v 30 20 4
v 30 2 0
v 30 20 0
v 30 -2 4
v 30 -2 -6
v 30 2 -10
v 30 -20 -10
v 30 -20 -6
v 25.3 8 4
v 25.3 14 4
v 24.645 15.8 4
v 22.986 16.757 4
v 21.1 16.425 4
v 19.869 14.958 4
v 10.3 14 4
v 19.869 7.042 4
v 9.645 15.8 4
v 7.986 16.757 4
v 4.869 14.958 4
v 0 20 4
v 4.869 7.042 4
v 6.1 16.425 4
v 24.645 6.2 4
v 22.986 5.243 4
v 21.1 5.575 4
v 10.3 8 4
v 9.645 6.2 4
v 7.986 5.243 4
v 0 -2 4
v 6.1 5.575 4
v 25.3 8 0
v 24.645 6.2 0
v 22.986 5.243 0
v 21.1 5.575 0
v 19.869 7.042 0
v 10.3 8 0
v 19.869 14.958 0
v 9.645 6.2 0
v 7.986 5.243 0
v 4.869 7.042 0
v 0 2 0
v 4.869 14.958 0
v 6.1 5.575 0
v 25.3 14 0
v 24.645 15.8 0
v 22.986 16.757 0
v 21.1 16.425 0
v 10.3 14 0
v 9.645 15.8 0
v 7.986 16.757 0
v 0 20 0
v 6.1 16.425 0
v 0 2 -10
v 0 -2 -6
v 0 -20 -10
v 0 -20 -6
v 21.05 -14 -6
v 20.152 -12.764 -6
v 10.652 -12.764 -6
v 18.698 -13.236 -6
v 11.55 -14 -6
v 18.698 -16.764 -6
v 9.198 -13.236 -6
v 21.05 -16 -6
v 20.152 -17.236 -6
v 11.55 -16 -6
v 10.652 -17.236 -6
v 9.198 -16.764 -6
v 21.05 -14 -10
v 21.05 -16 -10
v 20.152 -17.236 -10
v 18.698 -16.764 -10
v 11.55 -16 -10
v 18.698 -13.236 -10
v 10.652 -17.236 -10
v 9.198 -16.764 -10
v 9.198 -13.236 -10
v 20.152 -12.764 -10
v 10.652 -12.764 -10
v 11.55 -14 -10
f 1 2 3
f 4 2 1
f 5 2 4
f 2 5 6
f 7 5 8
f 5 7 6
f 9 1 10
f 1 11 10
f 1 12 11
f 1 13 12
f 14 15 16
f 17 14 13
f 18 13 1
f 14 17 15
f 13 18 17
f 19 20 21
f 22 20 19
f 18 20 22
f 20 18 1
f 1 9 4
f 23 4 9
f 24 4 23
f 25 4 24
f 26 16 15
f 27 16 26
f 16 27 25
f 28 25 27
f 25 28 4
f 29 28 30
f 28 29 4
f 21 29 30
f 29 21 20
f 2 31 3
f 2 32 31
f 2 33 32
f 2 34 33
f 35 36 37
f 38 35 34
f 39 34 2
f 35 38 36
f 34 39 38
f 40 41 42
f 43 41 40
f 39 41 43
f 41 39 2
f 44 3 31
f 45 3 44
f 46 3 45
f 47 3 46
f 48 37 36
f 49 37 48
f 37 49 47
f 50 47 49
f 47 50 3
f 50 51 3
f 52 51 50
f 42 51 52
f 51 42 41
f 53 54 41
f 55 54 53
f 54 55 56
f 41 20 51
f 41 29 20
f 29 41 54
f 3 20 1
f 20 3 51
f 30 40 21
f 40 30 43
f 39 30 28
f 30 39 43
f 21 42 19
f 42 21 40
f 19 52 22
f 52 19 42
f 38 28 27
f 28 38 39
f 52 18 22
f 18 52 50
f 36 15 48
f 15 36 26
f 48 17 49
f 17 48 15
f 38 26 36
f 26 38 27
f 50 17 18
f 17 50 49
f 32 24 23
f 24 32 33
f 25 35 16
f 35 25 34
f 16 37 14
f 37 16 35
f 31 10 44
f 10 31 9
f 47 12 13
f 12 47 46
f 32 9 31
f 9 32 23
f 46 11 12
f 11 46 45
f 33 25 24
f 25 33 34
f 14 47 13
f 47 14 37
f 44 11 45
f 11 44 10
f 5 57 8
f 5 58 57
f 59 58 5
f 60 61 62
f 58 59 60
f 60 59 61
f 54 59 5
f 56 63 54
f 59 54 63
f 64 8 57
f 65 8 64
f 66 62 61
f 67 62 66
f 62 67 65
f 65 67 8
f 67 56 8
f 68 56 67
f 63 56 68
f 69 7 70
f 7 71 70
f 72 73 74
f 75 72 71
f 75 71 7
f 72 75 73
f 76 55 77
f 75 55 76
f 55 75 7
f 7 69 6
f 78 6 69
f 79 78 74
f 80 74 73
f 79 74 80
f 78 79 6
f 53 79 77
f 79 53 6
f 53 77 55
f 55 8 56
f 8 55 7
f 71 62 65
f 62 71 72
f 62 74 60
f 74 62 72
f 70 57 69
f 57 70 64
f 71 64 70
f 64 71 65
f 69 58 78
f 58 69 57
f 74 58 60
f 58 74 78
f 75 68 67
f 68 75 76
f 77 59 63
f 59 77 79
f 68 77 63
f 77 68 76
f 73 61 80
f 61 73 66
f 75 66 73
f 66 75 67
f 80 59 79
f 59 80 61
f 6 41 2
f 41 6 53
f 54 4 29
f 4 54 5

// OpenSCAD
// switch hole distance
s_h_dist = 9.5;

// switch hole diameter
s_h_dia = 2+0.6;

// switch length
s_l = 20;

// switch height ( from extrusion)
s_h = 10;

width = 30;
length = 20;
height = 20;

thickness = 4;

switch_dist = 20;

// 2020 attach

difference(){
    
    cube([width,length,thickness]);
    hull(){
    translate([1/4*width,length*0.4,-0.5*thickness]) cylinder(2*thickness,d=5+0.6);
    translate([1/4*width,length*0.7,-0.5*thickness]) cylinder(2*thickness,d=5+0.6);
    }
    hull(){
    translate([3/4*width,length*0.4,-0.5*thickness]) cylinder(2*thickness,d=5+0.6);
    translate([3/4*width,length*0.7,-0.5*thickness]) cylinder(2*thickness,d=5+0.6);
    }
}

// Limit switch attach
translate([0,-switch_dist,-10 ])
difference(){
    translate([0,0,0]) cube([width,s_l,thickness]);
    hull(){
        translate([(s_h_dist+width)/2,thickness,-1]) 
        cylinder(thickness*1.5,d=s_h_dia);
        translate([(s_h_dist+width)/2,thickness+2,-1]) 
        cylinder(thickness*1.5,d=s_h_dia);
    }
    hull(){
        translate([(-s_h_dist+width)/2,thickness,-1])
        cylinder(thickness*1.5,d=s_h_dia);
        translate([(-s_h_dist+width)/2,thickness+2,-1])
        cylinder(thickness*1.5,d=s_h_dia);
    }
}

translate([0,-thickness/2,-s_h])
cube([width,thickness,s_h+thickness]);
